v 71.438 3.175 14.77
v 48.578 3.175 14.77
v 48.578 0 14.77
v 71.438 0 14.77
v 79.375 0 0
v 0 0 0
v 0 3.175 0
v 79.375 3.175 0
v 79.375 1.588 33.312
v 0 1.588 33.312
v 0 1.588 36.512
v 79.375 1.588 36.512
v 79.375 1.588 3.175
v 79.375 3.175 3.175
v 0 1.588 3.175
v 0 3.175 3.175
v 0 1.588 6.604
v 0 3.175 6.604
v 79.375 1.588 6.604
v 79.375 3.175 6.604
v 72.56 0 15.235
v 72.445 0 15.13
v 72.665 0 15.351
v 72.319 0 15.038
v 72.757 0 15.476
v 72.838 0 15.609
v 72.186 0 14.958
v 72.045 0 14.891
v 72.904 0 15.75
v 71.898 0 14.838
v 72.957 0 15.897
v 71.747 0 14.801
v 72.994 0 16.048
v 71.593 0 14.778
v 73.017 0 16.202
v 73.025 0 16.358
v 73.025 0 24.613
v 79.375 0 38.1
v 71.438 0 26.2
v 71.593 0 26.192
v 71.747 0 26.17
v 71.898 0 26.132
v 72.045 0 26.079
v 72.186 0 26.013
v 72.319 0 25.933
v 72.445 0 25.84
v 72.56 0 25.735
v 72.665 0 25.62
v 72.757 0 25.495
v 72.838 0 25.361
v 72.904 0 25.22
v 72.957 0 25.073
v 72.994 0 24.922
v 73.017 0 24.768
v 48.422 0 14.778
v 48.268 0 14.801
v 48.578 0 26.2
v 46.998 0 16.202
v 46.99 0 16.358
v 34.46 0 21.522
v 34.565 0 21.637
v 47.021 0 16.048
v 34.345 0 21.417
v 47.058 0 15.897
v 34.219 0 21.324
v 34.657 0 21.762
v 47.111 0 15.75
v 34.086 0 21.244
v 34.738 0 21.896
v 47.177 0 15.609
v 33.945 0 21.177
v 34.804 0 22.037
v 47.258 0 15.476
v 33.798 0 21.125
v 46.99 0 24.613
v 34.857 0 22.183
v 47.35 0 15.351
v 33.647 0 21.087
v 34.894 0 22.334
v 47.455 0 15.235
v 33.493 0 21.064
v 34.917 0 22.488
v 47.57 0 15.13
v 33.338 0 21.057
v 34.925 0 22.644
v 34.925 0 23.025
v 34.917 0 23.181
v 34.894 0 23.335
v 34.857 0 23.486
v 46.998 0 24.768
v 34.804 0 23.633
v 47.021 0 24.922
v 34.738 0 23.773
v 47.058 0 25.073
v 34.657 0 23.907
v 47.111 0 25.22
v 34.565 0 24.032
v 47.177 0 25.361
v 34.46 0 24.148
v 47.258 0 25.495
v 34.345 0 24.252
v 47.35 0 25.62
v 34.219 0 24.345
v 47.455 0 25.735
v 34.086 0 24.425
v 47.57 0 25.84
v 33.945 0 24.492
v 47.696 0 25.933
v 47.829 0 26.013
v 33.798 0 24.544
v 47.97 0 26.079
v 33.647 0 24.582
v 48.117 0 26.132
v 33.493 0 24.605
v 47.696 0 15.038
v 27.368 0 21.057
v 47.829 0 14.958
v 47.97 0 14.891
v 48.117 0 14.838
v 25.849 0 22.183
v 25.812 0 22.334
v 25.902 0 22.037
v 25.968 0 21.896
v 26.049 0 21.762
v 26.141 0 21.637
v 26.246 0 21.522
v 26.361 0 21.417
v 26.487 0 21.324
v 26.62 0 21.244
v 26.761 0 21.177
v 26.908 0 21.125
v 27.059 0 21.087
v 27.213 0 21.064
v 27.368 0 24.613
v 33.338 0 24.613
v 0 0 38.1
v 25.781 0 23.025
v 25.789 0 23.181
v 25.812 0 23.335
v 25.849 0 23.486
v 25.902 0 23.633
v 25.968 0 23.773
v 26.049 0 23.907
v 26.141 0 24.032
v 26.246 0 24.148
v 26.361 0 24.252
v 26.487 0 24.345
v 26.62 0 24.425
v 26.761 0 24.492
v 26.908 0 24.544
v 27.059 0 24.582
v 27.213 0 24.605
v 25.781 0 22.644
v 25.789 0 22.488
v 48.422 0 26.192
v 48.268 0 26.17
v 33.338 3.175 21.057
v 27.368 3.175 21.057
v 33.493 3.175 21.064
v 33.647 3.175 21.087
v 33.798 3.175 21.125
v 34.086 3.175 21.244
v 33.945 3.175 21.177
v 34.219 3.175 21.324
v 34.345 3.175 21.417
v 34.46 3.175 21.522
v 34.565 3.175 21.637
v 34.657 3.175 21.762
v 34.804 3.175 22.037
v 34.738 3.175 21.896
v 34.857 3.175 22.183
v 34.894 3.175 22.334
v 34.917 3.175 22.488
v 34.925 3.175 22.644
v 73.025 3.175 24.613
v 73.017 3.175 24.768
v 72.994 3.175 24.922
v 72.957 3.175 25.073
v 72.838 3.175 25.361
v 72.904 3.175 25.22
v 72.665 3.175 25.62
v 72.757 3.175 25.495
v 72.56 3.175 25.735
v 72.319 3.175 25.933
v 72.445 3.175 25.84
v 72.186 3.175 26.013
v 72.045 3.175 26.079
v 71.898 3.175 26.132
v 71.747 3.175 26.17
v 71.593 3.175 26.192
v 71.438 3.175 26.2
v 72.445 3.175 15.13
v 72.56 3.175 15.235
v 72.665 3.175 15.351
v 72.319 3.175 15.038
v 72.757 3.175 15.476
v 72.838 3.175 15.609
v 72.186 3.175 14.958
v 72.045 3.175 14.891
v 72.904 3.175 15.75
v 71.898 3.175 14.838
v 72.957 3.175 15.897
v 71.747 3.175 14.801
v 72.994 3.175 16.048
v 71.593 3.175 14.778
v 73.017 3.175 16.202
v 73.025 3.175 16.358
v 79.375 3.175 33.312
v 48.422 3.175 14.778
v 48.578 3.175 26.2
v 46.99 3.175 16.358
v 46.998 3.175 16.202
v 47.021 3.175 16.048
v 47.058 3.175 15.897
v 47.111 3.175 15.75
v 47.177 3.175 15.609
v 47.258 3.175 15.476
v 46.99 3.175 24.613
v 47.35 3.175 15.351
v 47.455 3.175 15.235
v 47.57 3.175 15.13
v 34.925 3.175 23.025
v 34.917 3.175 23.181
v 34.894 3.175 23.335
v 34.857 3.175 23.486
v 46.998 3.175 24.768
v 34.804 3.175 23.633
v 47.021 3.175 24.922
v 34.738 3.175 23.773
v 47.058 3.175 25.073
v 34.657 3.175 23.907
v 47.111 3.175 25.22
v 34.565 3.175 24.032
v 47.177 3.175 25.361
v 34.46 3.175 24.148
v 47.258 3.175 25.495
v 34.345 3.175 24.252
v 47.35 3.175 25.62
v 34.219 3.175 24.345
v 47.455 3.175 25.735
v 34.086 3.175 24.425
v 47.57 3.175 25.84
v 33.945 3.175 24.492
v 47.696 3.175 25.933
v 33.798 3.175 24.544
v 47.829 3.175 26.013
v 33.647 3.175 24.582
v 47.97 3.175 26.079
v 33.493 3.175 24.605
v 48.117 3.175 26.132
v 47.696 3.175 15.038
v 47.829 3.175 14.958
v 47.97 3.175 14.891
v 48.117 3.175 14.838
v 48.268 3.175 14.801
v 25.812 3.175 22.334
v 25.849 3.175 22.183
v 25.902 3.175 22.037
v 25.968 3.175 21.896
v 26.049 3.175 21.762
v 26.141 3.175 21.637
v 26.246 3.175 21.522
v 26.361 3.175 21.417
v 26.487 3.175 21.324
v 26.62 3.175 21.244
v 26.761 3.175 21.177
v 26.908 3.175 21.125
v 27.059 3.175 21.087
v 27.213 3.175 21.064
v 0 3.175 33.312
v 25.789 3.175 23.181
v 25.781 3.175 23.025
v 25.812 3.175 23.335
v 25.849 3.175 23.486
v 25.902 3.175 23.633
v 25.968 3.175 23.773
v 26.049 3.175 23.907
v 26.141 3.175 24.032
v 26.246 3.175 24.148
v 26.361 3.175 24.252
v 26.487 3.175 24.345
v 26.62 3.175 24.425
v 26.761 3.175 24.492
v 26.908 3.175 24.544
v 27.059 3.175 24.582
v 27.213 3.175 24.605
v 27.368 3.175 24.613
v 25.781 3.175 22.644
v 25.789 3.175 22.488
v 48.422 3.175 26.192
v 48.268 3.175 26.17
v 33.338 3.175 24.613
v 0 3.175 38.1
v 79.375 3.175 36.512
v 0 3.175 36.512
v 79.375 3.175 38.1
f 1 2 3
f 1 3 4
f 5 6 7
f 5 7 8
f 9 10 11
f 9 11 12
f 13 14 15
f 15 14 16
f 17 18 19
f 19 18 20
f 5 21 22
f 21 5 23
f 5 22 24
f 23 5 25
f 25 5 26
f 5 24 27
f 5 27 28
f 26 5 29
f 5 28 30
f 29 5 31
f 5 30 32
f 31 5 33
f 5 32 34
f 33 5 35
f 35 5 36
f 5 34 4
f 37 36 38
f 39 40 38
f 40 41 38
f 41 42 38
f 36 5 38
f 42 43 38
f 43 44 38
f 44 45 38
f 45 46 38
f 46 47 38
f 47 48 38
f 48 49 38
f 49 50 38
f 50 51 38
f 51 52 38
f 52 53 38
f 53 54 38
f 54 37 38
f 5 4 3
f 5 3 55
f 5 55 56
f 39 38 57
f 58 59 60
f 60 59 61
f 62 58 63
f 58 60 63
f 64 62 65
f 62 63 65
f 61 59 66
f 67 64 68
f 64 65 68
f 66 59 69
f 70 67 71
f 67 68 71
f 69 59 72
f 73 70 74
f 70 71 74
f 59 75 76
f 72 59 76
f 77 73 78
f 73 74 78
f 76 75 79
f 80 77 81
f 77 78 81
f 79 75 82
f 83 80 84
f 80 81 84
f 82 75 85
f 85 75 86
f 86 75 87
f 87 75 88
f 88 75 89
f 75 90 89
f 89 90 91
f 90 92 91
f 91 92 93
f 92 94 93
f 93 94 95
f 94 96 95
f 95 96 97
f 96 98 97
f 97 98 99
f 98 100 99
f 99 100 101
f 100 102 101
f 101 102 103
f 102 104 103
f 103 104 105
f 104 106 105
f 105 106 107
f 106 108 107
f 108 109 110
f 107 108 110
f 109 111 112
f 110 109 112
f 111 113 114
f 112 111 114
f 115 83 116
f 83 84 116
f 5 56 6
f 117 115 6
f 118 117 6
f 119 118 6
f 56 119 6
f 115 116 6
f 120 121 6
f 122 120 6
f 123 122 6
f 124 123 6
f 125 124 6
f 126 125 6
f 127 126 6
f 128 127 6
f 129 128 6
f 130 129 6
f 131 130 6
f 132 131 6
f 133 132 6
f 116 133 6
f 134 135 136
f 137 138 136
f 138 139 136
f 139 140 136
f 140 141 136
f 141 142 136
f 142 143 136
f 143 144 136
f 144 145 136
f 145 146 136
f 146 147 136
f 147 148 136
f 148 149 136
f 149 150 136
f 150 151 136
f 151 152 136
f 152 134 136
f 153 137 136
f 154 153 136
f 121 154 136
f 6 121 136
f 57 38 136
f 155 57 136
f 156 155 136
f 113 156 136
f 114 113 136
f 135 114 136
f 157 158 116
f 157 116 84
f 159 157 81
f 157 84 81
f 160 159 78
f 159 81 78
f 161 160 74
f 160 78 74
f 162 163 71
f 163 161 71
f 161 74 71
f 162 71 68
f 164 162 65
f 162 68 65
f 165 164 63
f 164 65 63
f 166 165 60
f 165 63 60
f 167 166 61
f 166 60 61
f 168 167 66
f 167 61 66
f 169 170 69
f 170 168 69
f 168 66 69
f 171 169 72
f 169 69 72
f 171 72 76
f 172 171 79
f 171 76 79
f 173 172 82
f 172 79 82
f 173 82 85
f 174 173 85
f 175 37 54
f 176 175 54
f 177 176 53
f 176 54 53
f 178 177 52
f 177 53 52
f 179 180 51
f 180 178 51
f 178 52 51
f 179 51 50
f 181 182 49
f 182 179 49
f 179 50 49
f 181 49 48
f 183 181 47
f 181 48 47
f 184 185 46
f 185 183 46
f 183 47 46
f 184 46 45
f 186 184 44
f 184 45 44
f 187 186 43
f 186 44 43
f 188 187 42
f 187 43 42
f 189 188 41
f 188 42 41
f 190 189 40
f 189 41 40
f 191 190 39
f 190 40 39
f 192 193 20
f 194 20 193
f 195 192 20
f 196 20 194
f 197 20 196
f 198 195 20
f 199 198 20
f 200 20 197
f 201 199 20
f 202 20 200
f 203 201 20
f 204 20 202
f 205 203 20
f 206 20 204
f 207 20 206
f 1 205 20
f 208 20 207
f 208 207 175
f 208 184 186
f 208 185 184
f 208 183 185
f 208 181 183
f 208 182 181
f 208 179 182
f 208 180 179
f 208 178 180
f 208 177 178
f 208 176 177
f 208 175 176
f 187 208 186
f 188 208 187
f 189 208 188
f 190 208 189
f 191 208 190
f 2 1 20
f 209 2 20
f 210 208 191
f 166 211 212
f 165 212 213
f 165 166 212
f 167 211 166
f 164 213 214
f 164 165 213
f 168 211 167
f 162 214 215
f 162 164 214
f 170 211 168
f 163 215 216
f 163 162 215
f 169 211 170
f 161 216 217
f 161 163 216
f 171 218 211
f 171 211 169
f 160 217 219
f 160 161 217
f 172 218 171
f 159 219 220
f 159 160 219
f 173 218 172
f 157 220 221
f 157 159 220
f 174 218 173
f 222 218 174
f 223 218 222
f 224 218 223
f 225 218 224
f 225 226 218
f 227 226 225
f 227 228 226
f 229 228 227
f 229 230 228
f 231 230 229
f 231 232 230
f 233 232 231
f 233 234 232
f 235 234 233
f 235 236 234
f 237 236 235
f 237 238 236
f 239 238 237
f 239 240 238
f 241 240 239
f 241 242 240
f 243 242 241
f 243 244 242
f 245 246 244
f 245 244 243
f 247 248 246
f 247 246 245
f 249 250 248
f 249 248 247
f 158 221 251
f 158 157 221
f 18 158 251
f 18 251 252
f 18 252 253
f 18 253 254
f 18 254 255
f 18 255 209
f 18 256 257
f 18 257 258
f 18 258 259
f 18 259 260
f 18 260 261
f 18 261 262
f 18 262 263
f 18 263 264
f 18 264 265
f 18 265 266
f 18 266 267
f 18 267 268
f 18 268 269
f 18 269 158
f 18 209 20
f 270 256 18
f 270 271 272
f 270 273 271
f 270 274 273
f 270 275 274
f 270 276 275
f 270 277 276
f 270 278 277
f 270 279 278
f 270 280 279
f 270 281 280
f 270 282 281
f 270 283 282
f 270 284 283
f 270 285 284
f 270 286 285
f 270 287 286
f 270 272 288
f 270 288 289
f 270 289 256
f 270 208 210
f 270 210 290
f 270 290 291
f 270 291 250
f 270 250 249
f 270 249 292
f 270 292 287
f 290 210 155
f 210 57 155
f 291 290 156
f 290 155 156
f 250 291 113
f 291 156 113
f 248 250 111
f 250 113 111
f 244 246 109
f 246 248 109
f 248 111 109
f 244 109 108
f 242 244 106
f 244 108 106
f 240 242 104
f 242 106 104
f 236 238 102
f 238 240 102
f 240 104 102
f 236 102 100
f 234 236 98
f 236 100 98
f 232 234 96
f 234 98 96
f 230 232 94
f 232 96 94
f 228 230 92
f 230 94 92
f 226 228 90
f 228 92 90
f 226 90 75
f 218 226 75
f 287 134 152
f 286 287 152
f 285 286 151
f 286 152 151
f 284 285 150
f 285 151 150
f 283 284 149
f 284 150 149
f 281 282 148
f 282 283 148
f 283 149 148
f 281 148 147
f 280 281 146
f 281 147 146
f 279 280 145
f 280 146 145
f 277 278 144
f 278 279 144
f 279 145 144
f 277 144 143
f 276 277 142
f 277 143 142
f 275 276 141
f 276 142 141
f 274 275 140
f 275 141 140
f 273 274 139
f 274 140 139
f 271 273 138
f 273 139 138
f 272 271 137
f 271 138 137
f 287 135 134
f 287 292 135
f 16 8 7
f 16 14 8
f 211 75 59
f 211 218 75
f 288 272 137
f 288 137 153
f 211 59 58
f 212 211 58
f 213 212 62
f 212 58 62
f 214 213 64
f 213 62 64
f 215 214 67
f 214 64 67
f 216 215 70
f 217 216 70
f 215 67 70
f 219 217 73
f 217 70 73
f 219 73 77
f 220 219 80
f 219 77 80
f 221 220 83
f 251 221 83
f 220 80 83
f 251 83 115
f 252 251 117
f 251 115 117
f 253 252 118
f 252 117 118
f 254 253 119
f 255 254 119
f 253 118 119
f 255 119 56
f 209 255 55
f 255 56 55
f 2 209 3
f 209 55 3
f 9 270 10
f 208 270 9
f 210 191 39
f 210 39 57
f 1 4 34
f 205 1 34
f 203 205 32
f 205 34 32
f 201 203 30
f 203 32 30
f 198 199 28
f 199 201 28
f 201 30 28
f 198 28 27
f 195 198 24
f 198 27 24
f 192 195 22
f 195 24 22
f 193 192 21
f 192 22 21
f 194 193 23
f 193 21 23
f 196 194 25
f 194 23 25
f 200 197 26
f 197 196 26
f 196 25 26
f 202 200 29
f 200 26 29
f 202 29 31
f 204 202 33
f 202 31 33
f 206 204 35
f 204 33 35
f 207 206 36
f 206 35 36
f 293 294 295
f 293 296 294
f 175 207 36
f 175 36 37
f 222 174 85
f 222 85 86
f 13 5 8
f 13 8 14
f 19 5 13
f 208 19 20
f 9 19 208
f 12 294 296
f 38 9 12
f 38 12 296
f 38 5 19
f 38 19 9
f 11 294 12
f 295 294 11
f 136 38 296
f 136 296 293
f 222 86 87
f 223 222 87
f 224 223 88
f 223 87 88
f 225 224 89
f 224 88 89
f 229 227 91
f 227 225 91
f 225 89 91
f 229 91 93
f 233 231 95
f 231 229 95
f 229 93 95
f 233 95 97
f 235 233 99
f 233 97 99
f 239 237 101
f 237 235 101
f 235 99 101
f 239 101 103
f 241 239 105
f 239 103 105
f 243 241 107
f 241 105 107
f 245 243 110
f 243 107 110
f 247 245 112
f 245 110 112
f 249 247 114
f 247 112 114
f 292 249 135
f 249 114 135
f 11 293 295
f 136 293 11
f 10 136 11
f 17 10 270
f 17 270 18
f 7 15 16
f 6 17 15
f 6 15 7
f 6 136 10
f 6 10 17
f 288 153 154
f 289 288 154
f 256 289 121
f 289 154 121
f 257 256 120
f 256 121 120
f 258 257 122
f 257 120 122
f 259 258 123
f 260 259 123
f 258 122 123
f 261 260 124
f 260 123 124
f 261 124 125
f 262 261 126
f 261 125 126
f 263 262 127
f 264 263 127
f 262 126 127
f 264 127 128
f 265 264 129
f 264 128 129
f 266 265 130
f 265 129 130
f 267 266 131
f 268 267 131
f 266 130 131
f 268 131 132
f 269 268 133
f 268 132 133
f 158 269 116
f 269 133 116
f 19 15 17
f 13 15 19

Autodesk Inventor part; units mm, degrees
ref_plane "YZ Plane" through (0, 0, 0) normal (1, 0, 0) x (0, 1, 0)
ref_plane "XZ Plane" through (0, 0, 0) normal (0, 1, 0) x (-1, 0, 0)
ref_plane "XY Plane" through (0, 0, 0) normal (0, 0, 1) x (1, 0, 0)
sketch "Sketch1" plane through (0, 0, 0) normal (0, 1, 0) x (-1, 0, 0)
  line L0 (0, 0) -> (-79.375, 0)
  line L1 (-79.375, 0) -> (-79.375, 38.1)
  line L2 (-79.375, 38.1) -> (0, 38.1)
  line L3 (0, 38.1) -> (0, 0)
  dimension "d0" = 79.375
  dimension "d1" = 38.1
extrude "Extrusion1" add sketch "Sketch1" along normal blind 3.175
sketch "Sketch2" plane through (0, 3.175, 0) normal (0, 1, 0) x (1, 0, 0)
  line L0 (0, 0) -> (0, -38.1) projected
  line L1 (79.375, -38.1) -> (79.375, 0) projected
  line L2 (0, -33.3121) -> (79.375, -33.3121)
  line L3 (79.375, -33.3121) -> (79.375, -36.5125)
  line L4 (79.375, -36.5125) -> (0, -36.5125)
  line L5 (0, -36.5125) -> (0, -33.3121)
  line L6 (0, -38.1) -> (79.375, -38.1) projected
  line L7 (79.375, 0) -> (0, 0) projected
  line L8 (79.375, -3.175) -> (0, -3.175)
  line L9 (0, -3.175) -> (0, -6.604)
  line L10 (0, -6.604) -> (79.375, -6.604)
  line L11 (79.375, -6.604) -> (79.375, -3.175)
  dimension "d4" = 3.2004
  dimension "d8" = 1.5875
  dimension "d13" = 3.175
  dimension "d14" = 3.429
extrude "Extrusion2" cut sketch "Sketch2" against normal blind 1.5875 contours L8 L1 L10 L0 | L2 L1 L4 L0
sketch "Sketch4" plane through (0, 3.175, 0) normal (0, 1, 0) x (1, 0, 0)
  line L0 (0, -33.3121) -> (79.375, -33.3121) projected
  line L1 (79.375, -33.3121) -> (79.375, -6.604) projected
  line L2 (25.781, -21.0566) -> (34.925, -21.0566)
  line L3 (34.925, -21.0566) -> (34.925, -24.6126)
  line L4 (34.925, -24.6126) -> (25.781, -24.6126)
  line L5 (25.781, -24.6126) -> (25.781, -21.0566)
  line L6 (46.99, -14.7701) -> (73.025, -14.7701)
  line L7 (73.025, -14.7701) -> (73.025, -26.2001)
  line L8 (73.025, -26.2001) -> (46.99, -26.2001)
  line L9 (46.99, -26.2001) -> (46.99, -14.7701)
  point P0 (0, 0)
  dimension "d15" = 3.556
  dimension "d16" = 9.144
  dimension "d17" = 8.6995
  dimension "d18" = 44.45
  dimension "d19" = 26.035
  dimension "d20" = 11.43
  dimension "d21" = 7.112
  dimension "d22" = 6.35
extrude "Extrusion4" cut sketch "Sketch4" against normal blind 25.4
fillet "Fillet1" radius 1.5875 4 edges at (25.781, 1.5875, 21.0566) (25.781, 1.5875, 24.6126) (34.925, 1.5875, 24.6126) (34.925, 1.5875, 21.0566)
fillet "Fillet2" radius 1.5875 4 edges at (73.025, 1.5875, 14.7701) (73.025, 1.5875, 26.2001) (46.99, 1.5875, 26.2001) (46.99, 1.5875, 14.7701)
properties part number "Electronics Container Part 2"
